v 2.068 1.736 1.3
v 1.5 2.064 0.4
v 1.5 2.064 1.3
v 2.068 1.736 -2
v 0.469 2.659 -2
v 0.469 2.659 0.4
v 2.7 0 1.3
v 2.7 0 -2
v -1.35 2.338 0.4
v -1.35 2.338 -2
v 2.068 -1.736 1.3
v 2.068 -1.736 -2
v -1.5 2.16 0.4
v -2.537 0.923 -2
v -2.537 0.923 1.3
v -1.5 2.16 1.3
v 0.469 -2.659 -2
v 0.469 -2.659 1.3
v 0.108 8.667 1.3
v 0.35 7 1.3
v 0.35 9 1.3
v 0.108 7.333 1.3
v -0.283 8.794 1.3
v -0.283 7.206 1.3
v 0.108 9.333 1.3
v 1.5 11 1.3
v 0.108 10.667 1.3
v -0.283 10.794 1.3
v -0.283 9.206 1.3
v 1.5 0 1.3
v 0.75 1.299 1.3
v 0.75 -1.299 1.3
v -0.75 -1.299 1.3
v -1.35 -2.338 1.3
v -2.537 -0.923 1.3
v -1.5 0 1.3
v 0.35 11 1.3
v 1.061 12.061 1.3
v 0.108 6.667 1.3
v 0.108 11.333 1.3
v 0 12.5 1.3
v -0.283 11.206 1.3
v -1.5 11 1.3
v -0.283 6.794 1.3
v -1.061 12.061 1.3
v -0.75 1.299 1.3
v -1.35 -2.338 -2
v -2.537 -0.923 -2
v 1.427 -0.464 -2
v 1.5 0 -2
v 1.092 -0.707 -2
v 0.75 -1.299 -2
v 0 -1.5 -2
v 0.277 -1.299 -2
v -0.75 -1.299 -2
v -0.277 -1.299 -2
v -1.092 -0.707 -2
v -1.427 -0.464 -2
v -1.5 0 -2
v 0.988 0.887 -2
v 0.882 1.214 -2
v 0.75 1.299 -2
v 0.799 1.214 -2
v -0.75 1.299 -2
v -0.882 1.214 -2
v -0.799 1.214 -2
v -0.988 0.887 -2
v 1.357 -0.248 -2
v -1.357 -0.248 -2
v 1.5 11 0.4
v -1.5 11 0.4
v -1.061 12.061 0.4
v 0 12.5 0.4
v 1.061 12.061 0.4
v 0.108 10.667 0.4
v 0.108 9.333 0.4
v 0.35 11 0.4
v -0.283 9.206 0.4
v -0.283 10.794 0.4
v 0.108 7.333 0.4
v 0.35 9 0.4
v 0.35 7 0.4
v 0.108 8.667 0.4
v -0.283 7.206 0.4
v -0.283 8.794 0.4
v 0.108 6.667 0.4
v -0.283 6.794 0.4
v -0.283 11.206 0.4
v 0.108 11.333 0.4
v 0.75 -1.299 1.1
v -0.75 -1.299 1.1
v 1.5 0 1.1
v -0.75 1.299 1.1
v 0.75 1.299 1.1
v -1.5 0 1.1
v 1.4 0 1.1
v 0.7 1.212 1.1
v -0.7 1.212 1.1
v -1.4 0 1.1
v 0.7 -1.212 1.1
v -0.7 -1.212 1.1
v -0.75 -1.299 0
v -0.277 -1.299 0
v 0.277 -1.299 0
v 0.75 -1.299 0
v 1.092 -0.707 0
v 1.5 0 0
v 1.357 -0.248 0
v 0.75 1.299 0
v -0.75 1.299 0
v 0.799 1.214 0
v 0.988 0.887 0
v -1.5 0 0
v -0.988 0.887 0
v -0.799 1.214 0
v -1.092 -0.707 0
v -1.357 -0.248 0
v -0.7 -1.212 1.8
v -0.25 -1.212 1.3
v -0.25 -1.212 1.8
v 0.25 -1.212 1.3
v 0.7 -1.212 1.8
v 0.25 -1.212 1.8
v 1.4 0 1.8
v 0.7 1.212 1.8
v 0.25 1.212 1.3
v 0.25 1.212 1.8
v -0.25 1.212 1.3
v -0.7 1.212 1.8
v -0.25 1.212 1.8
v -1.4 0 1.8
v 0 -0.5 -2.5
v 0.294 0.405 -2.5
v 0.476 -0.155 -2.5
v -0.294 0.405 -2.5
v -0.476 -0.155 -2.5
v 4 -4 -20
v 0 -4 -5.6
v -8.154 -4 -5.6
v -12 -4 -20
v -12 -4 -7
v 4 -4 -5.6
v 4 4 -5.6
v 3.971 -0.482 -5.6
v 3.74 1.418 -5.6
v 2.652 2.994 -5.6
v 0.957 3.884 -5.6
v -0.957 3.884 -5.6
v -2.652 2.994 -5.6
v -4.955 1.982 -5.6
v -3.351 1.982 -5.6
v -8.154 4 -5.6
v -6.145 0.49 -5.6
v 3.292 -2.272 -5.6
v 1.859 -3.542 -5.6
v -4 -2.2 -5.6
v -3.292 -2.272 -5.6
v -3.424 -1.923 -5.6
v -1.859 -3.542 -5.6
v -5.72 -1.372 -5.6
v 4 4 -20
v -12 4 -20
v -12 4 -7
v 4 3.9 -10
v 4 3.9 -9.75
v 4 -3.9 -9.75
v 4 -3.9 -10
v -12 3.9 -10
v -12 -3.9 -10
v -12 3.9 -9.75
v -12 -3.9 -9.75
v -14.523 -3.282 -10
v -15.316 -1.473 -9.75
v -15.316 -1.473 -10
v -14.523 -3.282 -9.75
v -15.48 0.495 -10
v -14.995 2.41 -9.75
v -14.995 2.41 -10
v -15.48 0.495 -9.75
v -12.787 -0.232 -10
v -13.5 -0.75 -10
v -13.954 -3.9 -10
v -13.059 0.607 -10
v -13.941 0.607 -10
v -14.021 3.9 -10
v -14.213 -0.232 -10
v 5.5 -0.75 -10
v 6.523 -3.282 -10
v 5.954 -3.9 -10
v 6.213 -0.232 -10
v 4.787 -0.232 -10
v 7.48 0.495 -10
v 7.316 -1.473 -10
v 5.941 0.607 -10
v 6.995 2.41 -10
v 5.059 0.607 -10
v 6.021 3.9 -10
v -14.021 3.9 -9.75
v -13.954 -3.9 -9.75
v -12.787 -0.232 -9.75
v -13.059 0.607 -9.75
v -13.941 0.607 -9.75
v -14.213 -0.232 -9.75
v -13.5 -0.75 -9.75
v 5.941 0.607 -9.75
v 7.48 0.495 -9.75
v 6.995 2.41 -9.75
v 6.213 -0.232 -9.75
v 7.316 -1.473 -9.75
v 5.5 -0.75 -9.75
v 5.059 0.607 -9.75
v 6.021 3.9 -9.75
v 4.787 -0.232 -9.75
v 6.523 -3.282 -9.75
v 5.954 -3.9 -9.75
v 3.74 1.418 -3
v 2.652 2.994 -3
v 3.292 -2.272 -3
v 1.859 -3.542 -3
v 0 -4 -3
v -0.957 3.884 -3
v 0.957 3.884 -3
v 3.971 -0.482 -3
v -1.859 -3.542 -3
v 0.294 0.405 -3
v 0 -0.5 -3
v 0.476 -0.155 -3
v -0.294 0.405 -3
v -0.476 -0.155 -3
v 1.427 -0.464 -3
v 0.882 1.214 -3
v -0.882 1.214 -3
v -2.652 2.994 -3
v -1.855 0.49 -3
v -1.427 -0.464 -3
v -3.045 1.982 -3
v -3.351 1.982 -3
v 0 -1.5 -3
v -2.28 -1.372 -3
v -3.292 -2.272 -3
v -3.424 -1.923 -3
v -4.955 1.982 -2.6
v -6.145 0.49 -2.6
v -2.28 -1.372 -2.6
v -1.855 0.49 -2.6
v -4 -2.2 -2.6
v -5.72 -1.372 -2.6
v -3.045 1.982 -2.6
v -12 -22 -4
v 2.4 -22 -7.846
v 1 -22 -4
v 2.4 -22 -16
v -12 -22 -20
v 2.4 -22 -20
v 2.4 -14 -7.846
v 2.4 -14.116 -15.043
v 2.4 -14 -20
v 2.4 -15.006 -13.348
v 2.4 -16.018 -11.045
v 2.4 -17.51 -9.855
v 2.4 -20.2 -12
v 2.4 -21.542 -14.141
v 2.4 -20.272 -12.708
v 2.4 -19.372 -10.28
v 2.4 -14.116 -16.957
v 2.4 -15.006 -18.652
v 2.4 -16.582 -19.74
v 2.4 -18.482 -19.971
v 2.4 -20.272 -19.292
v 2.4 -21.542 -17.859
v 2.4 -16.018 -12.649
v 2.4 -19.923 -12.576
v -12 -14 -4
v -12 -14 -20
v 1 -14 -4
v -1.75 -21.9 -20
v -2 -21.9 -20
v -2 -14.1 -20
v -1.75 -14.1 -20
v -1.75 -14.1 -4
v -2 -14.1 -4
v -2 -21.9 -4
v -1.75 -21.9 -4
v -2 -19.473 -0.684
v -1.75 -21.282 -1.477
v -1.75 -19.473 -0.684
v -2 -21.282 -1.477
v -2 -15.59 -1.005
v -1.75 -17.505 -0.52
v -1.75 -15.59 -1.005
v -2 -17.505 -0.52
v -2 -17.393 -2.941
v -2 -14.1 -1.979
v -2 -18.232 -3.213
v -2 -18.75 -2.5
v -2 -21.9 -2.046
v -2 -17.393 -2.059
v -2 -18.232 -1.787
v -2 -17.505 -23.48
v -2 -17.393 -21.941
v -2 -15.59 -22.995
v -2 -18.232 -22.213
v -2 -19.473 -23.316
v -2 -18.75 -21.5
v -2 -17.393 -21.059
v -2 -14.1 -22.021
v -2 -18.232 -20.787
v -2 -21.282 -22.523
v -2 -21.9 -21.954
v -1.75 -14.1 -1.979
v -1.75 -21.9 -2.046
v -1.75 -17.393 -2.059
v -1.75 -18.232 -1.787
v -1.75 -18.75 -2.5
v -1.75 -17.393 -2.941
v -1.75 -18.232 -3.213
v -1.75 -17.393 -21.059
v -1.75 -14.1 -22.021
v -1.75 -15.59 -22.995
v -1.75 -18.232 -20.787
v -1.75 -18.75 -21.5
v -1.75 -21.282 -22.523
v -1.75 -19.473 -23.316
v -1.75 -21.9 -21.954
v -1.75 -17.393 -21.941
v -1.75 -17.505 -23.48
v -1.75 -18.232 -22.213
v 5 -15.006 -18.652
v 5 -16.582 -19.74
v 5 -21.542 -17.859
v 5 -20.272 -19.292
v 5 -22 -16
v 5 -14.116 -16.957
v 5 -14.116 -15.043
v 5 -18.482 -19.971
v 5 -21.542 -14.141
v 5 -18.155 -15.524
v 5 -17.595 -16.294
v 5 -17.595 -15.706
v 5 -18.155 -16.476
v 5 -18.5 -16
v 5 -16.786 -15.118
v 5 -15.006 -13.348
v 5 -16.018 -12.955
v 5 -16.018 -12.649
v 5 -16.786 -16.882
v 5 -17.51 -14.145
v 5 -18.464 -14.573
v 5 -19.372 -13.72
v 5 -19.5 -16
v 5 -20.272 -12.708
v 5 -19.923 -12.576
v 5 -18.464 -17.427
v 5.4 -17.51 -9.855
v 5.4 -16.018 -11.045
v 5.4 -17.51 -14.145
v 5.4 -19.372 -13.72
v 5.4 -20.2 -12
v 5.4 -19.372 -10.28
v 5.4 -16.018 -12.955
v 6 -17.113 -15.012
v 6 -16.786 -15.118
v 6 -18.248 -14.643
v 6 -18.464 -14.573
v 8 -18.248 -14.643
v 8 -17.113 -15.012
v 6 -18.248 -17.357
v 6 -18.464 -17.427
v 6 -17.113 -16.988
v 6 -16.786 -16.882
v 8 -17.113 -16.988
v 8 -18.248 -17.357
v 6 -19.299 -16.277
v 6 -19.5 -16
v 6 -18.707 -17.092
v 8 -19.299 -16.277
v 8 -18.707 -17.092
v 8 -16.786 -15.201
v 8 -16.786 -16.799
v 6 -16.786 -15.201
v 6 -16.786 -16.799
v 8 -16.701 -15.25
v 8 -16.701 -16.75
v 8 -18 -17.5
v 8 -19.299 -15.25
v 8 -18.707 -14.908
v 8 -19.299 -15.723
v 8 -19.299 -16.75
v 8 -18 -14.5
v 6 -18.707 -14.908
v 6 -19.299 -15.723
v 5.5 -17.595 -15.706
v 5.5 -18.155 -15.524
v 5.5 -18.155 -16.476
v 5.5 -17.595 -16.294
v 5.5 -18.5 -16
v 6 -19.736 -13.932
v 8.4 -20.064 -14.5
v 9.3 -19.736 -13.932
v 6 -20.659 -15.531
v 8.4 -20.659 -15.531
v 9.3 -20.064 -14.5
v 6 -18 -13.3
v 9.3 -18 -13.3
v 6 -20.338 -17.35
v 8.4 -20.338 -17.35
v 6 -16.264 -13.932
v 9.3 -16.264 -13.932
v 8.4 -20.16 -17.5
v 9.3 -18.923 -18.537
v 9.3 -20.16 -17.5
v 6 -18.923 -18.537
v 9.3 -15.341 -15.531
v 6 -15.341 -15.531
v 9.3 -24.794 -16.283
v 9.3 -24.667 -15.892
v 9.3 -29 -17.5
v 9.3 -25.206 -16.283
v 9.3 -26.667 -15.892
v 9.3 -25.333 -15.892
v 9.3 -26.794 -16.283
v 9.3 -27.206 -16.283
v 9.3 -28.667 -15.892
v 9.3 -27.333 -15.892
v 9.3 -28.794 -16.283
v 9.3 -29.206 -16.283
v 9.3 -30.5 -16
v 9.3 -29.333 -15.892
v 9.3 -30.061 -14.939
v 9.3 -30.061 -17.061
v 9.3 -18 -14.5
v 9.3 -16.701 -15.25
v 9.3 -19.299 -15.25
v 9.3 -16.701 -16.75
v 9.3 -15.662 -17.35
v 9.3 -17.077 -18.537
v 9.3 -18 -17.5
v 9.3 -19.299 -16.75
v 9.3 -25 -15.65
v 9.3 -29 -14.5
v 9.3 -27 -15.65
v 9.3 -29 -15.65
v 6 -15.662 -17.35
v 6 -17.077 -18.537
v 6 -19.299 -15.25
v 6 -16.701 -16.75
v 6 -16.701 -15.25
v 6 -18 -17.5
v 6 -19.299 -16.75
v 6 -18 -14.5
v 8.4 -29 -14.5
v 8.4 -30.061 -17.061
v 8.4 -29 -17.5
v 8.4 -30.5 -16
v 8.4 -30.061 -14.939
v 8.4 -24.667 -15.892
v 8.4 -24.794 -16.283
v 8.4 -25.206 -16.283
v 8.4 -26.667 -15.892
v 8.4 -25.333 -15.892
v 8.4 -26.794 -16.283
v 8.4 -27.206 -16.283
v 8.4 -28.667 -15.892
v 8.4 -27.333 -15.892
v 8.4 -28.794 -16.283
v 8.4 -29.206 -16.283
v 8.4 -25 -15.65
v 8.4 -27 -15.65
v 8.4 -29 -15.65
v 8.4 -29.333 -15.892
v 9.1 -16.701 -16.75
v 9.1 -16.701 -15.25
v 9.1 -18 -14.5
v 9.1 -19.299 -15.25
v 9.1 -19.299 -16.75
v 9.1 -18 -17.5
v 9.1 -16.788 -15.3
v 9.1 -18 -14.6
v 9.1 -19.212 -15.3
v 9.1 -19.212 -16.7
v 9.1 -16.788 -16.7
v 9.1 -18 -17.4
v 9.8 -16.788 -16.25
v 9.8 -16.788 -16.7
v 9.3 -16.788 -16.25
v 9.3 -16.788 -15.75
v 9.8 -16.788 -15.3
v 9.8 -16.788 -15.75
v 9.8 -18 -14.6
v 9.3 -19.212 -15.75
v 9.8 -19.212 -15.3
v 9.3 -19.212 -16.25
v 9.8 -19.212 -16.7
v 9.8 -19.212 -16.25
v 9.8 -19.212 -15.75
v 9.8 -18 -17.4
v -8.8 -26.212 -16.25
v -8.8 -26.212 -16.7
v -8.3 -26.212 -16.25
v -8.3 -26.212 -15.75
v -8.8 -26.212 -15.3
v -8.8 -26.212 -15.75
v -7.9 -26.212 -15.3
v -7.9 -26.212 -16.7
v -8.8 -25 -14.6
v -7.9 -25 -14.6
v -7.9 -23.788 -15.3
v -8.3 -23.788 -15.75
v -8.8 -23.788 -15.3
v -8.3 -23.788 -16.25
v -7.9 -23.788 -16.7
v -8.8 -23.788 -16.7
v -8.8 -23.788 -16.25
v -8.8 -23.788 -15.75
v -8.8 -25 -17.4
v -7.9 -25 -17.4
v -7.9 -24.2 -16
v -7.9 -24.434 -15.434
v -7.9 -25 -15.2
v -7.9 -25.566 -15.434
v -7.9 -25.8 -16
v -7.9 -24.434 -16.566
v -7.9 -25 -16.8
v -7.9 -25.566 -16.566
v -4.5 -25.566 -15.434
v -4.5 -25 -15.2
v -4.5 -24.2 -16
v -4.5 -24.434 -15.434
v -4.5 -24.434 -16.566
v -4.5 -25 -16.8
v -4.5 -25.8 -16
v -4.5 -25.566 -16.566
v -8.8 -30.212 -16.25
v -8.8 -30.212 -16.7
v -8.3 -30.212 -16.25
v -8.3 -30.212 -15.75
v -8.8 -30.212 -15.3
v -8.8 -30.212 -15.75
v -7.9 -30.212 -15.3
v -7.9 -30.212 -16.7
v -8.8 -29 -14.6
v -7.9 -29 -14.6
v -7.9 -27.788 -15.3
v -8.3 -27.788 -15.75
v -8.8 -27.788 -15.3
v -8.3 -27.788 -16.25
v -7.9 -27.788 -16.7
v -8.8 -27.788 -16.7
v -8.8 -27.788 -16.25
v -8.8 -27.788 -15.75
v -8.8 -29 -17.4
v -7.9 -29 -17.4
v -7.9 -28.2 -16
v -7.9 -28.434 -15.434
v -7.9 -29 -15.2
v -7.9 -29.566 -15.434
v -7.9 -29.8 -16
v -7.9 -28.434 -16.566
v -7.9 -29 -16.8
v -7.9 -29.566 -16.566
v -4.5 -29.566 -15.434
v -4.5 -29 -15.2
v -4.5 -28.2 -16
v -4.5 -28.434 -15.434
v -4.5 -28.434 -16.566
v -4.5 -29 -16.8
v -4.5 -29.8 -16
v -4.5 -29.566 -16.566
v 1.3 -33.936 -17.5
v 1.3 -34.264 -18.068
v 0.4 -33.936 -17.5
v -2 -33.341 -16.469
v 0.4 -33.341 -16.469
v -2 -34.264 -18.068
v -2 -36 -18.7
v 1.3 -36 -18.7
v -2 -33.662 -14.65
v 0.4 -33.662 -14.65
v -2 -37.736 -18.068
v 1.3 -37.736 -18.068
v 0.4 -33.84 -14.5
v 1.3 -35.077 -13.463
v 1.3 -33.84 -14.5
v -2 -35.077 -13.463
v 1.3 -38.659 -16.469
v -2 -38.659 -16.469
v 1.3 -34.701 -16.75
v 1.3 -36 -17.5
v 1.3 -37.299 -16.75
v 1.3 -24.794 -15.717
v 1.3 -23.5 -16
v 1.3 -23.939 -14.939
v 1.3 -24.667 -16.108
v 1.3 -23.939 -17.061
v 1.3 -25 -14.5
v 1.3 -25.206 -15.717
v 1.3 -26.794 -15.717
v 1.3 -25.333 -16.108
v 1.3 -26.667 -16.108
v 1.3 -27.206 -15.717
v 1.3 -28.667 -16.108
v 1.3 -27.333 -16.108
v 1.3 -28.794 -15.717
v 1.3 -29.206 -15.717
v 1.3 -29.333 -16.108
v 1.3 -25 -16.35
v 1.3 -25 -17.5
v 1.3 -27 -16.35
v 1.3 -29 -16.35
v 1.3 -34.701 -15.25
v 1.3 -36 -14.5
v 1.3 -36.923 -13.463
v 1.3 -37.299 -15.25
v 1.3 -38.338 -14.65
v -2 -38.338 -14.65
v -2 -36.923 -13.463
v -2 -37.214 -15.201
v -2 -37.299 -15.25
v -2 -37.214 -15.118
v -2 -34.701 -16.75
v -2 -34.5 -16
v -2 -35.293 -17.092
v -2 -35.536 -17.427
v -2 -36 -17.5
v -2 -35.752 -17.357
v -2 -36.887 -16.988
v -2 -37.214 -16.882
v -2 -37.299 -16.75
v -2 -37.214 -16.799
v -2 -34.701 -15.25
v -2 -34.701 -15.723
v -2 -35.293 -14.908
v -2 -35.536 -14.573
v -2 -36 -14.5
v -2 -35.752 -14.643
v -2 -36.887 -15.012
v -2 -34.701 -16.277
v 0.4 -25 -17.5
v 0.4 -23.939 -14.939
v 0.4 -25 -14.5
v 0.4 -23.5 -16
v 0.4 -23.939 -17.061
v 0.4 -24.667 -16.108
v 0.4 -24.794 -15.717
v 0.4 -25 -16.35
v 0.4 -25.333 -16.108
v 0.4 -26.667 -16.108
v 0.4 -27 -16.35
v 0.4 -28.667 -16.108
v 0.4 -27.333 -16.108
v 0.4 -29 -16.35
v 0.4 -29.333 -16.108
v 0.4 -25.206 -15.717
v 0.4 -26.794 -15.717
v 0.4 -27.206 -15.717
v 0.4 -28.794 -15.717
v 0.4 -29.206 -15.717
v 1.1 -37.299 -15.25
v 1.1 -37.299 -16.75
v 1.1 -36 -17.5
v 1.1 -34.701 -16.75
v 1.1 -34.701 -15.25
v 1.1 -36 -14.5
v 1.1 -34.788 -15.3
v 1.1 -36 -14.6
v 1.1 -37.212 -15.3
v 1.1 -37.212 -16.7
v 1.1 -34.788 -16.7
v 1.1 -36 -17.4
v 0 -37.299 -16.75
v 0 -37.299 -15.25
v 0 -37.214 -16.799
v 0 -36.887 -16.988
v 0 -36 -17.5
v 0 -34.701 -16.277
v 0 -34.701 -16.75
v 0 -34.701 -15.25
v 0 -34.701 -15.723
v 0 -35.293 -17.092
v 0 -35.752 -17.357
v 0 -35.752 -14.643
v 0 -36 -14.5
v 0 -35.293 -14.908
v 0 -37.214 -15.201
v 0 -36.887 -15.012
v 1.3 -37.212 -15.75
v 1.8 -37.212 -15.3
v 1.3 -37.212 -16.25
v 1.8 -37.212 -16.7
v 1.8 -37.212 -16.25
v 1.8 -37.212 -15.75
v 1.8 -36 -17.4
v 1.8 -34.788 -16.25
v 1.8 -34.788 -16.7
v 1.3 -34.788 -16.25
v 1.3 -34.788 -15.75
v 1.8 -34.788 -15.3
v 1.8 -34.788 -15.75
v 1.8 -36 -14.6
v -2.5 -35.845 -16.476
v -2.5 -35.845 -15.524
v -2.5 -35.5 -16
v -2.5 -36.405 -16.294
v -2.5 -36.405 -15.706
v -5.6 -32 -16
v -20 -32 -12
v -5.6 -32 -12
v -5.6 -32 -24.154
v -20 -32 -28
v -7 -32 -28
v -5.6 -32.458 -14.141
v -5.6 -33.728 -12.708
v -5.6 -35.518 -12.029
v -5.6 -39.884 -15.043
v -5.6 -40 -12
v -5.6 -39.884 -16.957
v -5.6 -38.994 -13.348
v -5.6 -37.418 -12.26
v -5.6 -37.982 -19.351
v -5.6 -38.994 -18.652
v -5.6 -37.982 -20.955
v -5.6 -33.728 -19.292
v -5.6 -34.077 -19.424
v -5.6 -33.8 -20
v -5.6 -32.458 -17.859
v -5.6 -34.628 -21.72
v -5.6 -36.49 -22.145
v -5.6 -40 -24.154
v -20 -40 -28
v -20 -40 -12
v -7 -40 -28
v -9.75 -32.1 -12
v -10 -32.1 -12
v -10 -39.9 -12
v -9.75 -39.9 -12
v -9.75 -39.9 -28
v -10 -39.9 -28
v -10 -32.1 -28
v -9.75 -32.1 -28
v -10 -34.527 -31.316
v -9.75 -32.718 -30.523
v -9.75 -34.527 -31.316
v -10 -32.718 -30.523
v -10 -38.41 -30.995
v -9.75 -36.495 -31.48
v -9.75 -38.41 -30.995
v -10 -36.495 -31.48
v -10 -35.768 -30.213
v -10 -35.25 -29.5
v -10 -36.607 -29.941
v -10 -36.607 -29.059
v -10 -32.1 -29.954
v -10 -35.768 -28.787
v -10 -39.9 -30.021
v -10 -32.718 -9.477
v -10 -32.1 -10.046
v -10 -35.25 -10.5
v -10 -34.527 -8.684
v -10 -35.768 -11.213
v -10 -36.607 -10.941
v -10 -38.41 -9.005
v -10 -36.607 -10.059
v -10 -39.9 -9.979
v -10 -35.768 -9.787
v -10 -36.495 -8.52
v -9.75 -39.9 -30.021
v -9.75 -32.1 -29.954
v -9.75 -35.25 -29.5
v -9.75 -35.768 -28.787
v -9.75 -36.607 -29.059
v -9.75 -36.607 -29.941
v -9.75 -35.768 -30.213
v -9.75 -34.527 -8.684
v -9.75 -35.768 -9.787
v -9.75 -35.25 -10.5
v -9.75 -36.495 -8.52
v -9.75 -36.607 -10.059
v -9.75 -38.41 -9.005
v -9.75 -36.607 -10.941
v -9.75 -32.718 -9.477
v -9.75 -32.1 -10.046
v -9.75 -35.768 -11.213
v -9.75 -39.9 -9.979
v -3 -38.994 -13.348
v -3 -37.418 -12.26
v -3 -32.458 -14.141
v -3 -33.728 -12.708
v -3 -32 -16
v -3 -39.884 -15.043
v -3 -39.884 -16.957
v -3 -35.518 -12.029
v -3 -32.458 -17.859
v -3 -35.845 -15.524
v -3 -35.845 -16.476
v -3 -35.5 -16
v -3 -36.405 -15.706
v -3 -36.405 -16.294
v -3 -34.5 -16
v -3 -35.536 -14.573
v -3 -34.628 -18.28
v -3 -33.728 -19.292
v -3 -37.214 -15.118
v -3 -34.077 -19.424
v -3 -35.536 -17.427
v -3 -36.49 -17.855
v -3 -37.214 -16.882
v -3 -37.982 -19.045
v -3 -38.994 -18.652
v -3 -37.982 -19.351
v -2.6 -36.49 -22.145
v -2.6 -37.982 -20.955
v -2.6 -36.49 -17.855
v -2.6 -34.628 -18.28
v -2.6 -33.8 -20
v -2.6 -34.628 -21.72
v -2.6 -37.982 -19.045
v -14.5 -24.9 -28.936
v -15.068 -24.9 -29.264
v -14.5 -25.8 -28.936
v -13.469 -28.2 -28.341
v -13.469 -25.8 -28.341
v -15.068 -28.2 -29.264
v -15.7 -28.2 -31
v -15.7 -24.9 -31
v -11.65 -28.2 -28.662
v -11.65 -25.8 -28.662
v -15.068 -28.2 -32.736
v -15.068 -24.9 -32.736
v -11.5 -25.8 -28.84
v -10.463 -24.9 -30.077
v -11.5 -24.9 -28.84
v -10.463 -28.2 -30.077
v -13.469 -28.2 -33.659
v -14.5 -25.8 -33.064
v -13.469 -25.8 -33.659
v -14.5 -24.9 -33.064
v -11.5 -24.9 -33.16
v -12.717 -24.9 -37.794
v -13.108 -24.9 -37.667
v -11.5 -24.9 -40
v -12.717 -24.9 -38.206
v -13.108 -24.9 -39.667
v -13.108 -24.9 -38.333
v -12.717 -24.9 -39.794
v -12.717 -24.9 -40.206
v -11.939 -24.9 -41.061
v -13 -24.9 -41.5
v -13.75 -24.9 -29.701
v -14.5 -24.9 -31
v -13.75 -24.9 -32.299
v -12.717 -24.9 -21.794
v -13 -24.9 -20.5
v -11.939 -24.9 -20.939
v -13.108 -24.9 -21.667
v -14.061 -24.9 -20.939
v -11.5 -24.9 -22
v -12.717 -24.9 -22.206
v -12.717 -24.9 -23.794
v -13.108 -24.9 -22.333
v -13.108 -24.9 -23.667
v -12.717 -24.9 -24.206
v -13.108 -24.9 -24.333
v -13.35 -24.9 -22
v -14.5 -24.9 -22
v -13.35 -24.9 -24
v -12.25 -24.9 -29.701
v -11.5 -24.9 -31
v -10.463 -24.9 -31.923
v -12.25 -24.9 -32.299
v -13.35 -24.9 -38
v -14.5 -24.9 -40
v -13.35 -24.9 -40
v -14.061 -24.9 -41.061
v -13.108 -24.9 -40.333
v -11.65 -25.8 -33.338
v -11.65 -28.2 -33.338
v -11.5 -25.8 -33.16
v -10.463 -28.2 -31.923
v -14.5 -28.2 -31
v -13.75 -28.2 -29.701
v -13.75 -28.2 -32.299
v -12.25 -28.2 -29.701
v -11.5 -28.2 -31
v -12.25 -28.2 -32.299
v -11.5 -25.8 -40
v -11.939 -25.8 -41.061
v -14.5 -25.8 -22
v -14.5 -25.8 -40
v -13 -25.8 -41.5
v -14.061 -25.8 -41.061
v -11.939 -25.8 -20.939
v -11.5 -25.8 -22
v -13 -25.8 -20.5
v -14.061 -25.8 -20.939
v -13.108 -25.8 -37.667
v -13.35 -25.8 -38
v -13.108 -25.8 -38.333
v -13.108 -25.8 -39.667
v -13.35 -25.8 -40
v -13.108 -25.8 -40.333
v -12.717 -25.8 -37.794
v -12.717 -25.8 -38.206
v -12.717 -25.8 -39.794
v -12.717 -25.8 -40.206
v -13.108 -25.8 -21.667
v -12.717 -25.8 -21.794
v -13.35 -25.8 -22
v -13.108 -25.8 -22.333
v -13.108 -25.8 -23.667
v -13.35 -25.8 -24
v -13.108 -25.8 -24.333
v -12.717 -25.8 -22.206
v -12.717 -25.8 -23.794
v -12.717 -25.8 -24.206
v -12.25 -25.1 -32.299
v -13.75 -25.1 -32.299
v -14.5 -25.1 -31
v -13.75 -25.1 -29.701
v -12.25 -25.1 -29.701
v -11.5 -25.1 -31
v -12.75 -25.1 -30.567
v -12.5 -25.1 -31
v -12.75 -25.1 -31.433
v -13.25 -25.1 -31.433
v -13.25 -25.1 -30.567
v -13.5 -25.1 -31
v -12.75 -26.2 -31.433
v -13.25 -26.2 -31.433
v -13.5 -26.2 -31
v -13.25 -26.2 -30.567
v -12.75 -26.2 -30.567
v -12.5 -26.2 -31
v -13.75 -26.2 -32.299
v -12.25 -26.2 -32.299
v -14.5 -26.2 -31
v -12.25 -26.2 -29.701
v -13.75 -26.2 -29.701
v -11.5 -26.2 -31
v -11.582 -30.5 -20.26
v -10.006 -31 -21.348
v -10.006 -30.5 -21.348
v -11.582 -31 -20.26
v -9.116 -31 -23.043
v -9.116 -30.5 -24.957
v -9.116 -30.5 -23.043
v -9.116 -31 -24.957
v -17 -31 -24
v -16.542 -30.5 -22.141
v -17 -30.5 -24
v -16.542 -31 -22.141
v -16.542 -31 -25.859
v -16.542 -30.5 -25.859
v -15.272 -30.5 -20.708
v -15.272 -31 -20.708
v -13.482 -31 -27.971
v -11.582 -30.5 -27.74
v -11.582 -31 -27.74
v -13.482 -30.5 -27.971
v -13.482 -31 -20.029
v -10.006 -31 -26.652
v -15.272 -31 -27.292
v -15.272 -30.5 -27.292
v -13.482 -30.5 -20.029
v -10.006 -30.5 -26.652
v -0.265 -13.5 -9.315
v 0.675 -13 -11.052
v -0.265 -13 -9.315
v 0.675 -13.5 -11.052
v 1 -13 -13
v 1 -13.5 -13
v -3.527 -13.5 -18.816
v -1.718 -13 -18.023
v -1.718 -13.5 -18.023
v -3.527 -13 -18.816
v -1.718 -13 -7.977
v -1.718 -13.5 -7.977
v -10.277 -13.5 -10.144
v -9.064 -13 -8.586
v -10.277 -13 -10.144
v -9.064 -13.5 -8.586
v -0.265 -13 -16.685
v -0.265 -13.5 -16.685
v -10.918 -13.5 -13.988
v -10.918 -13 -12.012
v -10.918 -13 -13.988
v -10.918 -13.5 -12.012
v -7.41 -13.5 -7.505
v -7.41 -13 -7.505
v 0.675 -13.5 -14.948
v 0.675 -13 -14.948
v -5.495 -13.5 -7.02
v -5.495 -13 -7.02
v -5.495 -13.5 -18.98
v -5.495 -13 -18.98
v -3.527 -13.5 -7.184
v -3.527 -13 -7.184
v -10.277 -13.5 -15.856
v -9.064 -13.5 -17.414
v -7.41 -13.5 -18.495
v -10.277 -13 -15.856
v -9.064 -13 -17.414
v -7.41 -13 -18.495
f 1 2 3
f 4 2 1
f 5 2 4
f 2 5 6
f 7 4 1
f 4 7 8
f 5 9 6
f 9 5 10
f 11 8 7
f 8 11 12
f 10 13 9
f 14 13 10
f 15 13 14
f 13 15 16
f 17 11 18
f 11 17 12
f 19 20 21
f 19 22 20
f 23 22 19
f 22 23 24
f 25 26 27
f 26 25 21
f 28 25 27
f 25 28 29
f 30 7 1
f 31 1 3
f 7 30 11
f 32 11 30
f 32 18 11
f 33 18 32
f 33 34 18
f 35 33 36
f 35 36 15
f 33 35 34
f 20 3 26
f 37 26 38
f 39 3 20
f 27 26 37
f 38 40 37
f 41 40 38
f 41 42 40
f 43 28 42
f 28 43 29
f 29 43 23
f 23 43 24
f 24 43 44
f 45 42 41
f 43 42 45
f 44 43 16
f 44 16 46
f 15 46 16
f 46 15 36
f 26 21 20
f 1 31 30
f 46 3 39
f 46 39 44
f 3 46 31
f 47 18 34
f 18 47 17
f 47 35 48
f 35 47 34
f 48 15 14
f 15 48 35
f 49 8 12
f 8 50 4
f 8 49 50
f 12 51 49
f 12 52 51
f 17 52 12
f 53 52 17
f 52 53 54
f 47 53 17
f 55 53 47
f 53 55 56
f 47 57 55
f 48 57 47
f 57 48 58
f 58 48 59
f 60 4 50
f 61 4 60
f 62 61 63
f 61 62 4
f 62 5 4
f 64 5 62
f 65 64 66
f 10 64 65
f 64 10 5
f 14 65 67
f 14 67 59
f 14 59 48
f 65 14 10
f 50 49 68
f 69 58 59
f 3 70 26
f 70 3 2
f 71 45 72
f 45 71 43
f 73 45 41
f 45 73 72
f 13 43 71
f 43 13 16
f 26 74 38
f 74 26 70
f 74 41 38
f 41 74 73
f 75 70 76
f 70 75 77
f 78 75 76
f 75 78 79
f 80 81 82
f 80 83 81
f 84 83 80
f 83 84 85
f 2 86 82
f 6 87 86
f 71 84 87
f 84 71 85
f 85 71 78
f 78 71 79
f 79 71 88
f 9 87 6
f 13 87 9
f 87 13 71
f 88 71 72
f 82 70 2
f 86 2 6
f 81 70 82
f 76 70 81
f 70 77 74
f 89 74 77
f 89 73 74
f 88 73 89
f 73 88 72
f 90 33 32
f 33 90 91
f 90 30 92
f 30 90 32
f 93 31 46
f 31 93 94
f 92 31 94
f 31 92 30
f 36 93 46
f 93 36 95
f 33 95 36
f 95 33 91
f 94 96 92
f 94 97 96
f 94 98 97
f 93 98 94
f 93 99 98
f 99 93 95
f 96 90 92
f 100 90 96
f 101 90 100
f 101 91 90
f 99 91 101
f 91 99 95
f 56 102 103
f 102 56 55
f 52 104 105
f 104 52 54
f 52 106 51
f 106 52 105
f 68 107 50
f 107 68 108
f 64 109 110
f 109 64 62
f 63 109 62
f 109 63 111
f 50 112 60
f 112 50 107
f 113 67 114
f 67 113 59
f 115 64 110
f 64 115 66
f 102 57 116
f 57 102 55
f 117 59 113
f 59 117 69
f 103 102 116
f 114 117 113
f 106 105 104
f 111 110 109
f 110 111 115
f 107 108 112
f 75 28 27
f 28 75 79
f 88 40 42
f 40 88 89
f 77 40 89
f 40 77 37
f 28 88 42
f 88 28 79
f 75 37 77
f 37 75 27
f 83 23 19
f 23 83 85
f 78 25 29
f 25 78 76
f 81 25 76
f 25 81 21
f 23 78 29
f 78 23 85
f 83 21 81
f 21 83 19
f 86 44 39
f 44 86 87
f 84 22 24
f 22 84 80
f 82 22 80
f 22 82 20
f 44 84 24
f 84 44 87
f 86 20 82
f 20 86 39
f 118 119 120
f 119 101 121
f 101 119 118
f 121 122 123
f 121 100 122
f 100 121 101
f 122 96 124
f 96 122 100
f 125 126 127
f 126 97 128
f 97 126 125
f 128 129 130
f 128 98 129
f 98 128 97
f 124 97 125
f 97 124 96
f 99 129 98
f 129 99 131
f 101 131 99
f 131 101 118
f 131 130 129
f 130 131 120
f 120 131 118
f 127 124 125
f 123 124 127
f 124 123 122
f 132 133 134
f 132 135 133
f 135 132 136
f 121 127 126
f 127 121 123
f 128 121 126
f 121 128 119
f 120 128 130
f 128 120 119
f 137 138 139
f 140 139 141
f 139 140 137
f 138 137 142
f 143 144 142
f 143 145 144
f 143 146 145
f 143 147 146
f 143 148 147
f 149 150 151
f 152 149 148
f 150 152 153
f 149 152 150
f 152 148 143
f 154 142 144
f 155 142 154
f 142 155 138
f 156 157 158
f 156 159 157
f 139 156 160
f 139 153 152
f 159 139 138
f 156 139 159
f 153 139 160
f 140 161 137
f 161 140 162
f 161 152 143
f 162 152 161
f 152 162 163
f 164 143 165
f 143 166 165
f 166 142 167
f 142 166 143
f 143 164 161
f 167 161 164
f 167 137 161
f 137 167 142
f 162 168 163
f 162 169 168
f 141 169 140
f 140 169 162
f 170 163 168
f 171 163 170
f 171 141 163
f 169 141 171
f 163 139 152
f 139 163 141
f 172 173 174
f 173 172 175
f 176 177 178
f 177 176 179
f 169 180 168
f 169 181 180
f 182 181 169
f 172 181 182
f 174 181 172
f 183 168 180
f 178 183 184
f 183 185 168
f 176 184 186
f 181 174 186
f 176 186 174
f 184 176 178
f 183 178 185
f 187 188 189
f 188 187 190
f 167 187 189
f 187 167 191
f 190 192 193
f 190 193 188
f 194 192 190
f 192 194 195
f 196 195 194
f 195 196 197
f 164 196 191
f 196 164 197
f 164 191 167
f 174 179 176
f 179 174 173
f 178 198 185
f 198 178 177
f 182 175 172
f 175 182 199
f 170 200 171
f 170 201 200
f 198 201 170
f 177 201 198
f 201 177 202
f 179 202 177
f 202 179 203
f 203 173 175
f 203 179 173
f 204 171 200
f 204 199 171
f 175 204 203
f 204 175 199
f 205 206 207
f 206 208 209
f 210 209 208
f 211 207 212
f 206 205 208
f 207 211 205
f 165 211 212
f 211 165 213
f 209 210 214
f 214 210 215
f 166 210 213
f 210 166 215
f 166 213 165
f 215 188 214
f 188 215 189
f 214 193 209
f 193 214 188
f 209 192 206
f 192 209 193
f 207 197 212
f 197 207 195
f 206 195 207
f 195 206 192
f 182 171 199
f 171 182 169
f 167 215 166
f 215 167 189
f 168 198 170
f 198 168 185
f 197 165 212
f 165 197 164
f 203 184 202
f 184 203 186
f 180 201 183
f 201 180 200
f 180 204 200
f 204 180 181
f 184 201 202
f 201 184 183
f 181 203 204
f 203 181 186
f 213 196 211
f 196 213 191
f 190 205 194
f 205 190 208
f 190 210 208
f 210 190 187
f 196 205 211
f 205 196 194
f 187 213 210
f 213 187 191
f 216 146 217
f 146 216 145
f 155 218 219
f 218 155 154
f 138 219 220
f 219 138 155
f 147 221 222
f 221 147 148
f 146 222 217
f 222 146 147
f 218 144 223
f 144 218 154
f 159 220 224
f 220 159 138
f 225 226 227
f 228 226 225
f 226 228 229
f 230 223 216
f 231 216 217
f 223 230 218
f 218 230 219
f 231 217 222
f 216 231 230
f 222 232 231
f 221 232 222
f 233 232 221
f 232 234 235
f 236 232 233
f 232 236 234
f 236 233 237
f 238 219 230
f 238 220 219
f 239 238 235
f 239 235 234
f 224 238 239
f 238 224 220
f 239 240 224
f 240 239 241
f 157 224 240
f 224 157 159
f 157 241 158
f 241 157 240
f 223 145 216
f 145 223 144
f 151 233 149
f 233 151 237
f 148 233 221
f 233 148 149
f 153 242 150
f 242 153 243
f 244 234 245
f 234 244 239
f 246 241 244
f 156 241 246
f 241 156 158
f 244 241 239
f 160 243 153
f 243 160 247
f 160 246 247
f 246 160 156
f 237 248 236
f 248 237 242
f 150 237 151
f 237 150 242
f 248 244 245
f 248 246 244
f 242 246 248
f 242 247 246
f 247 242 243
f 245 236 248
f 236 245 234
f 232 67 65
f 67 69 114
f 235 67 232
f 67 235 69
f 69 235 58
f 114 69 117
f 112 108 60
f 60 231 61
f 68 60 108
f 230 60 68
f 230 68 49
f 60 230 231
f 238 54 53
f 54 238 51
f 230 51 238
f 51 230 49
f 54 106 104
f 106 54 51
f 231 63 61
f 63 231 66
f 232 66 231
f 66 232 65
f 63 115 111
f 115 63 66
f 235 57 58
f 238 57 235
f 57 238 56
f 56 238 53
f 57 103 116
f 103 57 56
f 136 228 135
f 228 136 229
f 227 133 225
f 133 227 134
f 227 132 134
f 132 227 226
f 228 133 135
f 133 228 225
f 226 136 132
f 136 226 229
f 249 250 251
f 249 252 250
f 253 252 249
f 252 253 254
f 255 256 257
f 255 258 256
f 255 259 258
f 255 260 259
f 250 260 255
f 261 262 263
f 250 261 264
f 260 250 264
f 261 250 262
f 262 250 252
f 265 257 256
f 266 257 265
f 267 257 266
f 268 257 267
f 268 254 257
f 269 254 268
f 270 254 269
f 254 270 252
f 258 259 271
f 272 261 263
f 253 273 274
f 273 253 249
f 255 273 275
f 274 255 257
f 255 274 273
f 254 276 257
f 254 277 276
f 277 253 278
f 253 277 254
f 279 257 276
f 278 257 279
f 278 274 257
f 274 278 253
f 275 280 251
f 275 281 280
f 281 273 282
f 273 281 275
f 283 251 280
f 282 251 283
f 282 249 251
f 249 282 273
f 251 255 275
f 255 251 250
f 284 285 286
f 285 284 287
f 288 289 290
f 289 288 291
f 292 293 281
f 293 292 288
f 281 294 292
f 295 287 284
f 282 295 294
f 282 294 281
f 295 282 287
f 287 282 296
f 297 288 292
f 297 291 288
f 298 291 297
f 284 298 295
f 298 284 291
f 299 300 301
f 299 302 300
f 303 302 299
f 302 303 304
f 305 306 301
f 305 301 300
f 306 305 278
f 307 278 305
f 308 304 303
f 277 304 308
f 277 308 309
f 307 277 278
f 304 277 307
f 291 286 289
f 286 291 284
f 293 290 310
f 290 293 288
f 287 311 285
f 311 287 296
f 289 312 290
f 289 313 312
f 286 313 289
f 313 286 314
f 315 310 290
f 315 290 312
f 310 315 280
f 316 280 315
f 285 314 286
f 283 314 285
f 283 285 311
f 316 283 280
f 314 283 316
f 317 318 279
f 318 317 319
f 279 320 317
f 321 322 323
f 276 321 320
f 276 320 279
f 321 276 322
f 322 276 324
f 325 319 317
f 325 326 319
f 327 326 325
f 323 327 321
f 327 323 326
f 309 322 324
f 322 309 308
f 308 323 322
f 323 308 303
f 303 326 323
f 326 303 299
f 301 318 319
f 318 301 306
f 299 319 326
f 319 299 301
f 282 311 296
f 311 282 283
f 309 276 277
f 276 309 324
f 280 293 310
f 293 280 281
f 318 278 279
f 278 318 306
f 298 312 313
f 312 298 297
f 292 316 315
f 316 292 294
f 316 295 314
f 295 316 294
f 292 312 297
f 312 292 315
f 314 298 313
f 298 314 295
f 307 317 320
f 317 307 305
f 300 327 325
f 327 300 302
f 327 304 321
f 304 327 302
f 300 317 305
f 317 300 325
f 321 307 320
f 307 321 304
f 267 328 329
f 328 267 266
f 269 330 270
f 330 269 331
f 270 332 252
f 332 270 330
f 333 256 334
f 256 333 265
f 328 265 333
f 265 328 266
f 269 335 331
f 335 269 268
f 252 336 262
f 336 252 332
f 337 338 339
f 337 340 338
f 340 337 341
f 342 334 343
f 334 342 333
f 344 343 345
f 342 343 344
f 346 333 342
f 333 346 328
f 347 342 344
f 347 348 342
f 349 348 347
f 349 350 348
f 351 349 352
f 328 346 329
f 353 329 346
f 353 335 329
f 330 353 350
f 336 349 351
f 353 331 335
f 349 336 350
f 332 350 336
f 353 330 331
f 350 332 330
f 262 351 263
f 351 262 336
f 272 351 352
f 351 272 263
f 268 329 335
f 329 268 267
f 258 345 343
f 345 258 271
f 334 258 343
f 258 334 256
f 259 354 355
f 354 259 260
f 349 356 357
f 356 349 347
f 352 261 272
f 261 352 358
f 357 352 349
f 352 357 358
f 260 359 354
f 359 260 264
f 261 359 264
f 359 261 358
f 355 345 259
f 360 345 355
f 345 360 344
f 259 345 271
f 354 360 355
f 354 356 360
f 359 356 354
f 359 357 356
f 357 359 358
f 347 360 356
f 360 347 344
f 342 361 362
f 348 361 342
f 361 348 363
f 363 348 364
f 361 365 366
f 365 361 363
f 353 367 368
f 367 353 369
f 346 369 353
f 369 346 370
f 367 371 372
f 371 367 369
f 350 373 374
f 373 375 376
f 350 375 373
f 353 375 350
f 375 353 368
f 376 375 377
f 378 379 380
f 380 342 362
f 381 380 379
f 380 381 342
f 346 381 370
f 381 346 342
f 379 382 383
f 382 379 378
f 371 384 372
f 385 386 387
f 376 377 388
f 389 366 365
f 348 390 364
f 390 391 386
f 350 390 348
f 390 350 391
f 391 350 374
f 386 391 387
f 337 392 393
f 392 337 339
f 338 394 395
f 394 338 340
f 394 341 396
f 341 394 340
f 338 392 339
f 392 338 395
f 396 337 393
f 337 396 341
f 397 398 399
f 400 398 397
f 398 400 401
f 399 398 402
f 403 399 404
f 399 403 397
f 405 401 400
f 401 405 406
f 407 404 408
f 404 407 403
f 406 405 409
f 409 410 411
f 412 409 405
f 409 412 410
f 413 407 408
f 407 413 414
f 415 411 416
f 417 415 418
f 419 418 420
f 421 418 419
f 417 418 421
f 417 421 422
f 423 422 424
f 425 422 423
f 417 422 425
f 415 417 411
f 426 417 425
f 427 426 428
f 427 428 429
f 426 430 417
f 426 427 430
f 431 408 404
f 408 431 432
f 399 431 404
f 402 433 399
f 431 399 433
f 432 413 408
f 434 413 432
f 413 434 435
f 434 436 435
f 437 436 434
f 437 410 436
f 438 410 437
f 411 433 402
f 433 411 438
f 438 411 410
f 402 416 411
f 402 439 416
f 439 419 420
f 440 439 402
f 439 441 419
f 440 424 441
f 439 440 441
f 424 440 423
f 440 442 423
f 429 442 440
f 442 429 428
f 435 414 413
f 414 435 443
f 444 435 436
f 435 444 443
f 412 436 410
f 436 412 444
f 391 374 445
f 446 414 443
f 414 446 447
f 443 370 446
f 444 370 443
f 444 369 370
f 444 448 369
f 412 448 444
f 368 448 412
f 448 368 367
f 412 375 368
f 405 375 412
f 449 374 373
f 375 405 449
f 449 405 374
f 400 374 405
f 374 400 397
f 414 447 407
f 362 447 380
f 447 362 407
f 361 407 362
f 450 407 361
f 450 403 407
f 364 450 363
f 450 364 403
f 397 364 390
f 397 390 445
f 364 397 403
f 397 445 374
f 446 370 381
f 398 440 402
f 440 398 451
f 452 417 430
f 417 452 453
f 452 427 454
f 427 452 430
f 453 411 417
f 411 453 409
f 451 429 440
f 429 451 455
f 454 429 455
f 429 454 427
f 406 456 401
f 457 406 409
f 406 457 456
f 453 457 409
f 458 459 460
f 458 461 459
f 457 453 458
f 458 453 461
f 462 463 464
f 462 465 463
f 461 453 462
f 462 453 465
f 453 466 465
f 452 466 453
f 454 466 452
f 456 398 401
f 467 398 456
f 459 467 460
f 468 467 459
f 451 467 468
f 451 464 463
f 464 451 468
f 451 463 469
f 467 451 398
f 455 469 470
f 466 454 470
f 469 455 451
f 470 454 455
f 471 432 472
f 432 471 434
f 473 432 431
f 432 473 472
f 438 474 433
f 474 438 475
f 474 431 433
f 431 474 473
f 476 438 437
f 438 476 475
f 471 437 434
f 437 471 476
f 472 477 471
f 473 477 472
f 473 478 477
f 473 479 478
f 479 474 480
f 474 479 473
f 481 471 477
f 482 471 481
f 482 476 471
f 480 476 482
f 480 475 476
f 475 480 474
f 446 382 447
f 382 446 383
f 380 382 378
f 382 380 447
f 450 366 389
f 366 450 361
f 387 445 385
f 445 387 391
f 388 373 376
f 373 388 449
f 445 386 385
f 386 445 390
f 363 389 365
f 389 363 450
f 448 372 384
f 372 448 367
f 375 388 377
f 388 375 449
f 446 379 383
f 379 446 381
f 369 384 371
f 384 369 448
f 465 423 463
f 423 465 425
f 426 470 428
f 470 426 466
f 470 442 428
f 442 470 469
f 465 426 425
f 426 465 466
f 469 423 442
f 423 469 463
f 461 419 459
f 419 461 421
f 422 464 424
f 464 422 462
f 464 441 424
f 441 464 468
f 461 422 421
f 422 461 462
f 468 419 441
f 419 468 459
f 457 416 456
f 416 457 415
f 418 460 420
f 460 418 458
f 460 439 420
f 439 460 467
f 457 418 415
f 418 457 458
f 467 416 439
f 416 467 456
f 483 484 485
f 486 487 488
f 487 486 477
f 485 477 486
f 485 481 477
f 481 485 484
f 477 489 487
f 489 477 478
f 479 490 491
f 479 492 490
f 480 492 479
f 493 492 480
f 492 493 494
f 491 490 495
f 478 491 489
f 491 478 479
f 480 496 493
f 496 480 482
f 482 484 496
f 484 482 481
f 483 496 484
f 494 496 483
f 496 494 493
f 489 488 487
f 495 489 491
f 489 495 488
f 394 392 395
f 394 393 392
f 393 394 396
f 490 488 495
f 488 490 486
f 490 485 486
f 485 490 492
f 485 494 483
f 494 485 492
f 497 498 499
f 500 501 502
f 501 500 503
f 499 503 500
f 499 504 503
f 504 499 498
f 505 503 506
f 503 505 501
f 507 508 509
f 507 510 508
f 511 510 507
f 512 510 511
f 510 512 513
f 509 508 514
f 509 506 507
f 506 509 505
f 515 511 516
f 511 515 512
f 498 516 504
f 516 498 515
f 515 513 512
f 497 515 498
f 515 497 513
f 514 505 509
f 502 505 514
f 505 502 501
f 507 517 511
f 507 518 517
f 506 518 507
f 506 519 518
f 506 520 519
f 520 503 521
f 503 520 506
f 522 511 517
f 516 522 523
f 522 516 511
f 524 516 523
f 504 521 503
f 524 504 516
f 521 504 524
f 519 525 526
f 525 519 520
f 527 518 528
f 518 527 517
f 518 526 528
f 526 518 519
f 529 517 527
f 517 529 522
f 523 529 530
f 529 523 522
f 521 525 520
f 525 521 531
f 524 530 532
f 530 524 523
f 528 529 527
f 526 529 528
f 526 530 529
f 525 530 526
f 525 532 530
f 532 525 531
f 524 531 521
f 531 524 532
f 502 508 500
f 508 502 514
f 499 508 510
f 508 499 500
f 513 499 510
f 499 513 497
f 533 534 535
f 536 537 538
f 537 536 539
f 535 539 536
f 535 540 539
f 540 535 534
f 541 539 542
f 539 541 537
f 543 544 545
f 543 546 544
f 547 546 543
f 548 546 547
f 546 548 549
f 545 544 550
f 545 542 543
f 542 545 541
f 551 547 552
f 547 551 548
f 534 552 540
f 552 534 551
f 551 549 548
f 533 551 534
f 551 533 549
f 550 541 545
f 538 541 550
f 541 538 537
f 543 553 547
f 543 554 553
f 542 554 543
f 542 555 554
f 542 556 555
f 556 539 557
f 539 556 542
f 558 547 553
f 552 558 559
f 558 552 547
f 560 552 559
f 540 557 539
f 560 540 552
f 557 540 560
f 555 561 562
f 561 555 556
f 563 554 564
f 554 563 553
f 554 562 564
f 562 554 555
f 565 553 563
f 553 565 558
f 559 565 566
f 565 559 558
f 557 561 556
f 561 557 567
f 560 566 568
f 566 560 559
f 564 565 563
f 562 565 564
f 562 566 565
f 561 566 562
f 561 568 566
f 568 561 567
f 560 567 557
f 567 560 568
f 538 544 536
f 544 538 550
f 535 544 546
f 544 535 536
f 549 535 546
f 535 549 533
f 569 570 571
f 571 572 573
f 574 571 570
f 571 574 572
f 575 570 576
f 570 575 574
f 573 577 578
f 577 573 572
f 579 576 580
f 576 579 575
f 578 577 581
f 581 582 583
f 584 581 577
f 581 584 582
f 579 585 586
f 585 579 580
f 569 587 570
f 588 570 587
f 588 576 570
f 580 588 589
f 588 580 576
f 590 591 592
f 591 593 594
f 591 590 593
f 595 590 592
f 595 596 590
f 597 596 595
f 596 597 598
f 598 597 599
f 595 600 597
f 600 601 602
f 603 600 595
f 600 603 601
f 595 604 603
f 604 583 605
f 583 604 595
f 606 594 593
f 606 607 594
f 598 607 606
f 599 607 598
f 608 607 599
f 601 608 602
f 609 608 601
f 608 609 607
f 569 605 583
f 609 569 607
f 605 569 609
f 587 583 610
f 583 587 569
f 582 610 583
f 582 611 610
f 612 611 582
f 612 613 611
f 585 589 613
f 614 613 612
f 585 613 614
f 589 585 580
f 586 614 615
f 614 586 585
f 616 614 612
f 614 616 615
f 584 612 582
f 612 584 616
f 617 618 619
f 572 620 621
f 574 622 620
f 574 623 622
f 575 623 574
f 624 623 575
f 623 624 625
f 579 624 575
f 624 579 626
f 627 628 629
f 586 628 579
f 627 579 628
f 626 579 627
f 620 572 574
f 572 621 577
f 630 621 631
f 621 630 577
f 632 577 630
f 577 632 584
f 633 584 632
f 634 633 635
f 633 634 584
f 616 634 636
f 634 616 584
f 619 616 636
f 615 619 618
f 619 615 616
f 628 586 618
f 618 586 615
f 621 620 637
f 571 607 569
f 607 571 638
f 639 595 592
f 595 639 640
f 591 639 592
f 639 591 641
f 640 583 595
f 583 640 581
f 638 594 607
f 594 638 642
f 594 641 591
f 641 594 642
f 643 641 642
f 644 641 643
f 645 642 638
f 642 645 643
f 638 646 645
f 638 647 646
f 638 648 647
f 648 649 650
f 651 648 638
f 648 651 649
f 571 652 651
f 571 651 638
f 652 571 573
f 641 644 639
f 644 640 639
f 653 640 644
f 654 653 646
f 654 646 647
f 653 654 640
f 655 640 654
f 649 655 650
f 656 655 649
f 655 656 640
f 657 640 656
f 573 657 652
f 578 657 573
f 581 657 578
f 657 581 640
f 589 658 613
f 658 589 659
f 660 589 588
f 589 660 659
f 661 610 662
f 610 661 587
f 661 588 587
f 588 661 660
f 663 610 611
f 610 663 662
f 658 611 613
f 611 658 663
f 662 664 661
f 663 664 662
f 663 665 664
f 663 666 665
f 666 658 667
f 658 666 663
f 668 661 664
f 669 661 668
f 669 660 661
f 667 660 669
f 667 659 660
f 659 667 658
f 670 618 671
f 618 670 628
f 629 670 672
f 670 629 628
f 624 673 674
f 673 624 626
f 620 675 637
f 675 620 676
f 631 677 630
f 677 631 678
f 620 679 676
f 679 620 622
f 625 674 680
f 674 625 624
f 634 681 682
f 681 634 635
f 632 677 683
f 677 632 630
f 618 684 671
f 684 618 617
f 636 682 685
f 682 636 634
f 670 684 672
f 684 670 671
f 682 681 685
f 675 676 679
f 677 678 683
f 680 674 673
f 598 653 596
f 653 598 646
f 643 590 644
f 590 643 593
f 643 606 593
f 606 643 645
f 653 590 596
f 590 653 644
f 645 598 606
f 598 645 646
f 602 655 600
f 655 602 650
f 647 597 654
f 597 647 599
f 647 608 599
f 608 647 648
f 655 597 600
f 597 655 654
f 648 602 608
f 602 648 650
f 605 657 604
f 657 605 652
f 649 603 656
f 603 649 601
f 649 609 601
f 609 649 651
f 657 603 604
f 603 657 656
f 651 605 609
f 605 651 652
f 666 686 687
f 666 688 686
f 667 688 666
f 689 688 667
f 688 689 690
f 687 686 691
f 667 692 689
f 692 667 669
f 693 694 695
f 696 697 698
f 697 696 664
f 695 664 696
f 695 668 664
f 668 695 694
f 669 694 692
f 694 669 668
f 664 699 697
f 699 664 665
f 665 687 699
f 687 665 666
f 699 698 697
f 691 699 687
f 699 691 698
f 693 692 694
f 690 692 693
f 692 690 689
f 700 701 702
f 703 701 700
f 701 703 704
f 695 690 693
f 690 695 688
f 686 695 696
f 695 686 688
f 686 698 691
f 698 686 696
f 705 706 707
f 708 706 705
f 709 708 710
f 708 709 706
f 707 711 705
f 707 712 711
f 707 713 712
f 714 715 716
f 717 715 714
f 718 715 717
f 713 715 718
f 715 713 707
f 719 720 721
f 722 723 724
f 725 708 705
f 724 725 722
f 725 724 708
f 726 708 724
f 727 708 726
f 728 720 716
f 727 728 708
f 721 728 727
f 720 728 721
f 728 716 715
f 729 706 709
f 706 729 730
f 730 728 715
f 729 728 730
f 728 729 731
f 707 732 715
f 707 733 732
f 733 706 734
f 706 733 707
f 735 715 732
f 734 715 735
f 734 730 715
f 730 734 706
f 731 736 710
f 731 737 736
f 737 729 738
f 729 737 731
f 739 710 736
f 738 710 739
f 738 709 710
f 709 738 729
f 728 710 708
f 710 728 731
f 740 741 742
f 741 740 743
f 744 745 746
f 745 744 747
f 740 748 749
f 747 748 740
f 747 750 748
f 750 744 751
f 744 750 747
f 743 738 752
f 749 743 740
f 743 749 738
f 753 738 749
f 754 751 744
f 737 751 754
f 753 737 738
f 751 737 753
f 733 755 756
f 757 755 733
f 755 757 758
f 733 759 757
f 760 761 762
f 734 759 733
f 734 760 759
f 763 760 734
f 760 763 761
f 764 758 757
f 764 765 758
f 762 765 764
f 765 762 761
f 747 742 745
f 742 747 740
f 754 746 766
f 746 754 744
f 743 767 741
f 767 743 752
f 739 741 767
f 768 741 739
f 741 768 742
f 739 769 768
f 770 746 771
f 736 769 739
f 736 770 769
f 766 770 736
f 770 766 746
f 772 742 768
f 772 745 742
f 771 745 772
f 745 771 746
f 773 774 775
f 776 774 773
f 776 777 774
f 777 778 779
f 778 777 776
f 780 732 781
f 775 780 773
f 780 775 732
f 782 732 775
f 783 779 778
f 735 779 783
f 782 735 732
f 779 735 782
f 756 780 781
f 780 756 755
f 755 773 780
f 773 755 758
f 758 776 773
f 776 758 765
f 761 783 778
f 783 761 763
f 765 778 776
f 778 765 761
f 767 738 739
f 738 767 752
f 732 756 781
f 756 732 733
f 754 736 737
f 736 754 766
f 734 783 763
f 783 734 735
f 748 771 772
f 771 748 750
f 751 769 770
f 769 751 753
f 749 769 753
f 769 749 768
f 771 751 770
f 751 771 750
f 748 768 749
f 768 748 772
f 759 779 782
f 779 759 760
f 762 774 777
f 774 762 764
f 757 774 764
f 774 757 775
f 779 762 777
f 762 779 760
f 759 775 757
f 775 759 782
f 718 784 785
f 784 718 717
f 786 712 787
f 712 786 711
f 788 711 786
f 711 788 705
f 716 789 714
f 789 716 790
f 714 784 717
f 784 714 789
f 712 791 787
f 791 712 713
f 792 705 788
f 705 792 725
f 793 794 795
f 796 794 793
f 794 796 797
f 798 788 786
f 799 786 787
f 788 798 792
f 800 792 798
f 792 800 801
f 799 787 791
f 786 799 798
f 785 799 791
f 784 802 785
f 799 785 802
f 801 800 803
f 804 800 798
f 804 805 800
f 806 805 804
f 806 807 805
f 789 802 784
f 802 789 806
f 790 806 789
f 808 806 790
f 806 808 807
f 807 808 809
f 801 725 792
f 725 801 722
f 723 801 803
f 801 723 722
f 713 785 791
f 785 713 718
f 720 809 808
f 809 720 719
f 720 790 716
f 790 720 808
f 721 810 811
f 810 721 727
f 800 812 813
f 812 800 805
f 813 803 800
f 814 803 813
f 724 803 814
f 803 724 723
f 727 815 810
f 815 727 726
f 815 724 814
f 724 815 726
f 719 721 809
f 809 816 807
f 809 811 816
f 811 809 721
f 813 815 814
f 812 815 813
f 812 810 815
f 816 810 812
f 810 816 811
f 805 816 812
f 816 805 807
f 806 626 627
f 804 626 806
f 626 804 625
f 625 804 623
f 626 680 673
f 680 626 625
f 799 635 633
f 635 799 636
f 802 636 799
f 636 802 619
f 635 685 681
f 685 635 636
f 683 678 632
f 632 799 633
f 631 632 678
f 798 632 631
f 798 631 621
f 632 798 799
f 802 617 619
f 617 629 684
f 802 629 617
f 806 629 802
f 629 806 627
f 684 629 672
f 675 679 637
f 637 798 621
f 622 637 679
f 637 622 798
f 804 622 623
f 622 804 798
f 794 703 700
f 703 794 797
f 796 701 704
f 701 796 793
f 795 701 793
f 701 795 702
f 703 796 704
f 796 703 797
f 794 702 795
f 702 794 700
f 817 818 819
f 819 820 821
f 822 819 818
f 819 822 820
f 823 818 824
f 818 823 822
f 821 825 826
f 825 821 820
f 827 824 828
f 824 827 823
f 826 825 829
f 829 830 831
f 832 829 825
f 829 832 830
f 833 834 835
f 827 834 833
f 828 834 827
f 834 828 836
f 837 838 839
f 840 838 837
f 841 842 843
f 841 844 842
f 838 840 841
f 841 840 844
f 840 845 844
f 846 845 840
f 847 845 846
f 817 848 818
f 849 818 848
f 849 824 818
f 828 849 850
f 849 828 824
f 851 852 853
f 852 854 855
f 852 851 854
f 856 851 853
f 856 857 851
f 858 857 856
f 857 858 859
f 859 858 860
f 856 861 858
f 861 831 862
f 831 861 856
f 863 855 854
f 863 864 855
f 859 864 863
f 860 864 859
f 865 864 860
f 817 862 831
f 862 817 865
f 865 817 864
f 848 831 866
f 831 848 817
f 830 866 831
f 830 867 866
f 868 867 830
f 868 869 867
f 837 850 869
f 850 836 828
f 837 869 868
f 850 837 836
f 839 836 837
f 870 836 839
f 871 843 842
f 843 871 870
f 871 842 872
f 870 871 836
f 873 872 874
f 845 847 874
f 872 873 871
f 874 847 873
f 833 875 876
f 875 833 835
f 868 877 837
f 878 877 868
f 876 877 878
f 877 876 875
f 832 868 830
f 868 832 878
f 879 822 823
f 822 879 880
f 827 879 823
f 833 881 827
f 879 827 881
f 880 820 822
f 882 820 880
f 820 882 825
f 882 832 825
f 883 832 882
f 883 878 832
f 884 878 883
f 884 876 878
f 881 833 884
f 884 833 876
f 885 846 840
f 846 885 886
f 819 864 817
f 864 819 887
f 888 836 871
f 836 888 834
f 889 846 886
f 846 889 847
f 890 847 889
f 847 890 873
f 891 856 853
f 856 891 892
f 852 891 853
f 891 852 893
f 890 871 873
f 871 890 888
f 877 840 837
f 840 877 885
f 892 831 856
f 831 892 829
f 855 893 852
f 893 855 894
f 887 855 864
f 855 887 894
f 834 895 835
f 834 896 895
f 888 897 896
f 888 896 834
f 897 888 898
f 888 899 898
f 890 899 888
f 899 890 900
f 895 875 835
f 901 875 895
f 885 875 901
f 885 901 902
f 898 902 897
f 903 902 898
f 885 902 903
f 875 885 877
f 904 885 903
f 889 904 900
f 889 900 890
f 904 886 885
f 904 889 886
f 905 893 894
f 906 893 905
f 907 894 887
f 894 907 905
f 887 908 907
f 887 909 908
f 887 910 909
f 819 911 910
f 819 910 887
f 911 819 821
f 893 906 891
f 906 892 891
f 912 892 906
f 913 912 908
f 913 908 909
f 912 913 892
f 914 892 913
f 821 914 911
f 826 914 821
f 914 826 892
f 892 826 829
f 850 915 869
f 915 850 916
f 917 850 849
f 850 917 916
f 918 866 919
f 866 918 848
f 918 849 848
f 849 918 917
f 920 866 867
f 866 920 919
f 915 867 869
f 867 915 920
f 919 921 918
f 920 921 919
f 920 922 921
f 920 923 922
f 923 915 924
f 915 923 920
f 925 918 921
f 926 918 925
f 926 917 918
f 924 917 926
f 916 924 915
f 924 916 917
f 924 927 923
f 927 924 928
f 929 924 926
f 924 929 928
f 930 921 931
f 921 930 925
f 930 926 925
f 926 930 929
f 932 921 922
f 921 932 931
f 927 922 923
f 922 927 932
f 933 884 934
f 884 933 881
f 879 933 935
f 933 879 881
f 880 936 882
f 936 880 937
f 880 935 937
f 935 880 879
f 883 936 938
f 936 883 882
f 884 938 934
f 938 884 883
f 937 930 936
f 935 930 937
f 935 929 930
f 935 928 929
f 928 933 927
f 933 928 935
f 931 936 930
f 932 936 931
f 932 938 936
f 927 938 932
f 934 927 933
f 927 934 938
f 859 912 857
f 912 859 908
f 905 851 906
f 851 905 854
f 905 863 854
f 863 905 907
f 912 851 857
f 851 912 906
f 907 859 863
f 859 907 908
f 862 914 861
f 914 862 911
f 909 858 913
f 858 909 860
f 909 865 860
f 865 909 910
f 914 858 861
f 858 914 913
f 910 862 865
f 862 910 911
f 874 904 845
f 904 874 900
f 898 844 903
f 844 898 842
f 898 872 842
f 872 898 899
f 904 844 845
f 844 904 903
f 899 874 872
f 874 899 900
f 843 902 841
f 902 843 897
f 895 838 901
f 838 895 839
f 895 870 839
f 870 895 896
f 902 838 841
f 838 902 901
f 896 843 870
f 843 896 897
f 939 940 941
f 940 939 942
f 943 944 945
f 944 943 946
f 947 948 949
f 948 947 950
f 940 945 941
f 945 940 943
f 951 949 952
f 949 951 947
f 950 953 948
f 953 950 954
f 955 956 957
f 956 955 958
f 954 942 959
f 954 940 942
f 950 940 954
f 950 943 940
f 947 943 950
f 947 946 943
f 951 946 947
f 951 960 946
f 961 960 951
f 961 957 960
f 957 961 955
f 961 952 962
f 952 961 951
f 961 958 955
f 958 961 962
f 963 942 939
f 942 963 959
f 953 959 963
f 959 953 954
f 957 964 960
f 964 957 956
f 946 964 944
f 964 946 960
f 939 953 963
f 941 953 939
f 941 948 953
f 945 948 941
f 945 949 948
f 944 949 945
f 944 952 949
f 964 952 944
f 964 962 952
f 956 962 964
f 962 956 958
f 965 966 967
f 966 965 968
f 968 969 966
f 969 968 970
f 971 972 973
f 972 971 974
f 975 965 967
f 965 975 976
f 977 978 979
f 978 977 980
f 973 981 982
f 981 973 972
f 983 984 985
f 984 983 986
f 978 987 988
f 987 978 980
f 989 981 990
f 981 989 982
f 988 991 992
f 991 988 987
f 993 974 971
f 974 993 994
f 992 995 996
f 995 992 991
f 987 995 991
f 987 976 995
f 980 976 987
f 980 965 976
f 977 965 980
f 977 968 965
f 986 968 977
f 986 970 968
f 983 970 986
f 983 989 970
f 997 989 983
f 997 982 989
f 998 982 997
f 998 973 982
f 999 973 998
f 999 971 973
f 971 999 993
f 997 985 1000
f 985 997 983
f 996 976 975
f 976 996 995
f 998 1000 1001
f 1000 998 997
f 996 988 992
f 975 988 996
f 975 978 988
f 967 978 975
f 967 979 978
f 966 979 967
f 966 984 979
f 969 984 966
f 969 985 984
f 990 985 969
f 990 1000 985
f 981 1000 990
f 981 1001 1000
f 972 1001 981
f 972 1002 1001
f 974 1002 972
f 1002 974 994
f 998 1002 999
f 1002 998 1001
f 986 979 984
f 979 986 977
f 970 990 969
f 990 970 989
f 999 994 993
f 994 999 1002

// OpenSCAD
use <../parts.scad>

HK15318_single_horn();
translate([0, 0, -2.5]) SG90_horn_screw();
rotate(-90) HK15318();
color("LightSkyBlue", 0.5) translate([-5, -13, -13]) rotate([90, 0, 0]) cylinder(r=6, h=0.5);
translate([8, -18, -16]) rotate([90, 180, 90]) {
    HK15318();
    rotate(-90) {
        HK15318_single_horn();
        translate([0, 0, -2.5]) SG90_horn_screw();
        translate([0, 7, -12.5]) rotate([180, 0 ,0]) SG90_horn_screw();
        translate([0, 11, -12.5]) rotate([180, 0 ,0]) SG90_horn_screw();
        translate([0, 18, -8]) rotate(180) {
            HK15318_single_horn();
            translate([0, 0, -2.5]) SG90_horn_screw();
            rotate(90) {
                HK15318();
                translate([9.8, -15, -13]) rotate([0, 90, 0])
                    HK15318_double_horn();
                    color("LightSkyBlue", 0.5) translate([5, -8, -13]) rotate([0, 90, 0]) cylinder(r=4, h=0.5);
            }
        }
    }
}
